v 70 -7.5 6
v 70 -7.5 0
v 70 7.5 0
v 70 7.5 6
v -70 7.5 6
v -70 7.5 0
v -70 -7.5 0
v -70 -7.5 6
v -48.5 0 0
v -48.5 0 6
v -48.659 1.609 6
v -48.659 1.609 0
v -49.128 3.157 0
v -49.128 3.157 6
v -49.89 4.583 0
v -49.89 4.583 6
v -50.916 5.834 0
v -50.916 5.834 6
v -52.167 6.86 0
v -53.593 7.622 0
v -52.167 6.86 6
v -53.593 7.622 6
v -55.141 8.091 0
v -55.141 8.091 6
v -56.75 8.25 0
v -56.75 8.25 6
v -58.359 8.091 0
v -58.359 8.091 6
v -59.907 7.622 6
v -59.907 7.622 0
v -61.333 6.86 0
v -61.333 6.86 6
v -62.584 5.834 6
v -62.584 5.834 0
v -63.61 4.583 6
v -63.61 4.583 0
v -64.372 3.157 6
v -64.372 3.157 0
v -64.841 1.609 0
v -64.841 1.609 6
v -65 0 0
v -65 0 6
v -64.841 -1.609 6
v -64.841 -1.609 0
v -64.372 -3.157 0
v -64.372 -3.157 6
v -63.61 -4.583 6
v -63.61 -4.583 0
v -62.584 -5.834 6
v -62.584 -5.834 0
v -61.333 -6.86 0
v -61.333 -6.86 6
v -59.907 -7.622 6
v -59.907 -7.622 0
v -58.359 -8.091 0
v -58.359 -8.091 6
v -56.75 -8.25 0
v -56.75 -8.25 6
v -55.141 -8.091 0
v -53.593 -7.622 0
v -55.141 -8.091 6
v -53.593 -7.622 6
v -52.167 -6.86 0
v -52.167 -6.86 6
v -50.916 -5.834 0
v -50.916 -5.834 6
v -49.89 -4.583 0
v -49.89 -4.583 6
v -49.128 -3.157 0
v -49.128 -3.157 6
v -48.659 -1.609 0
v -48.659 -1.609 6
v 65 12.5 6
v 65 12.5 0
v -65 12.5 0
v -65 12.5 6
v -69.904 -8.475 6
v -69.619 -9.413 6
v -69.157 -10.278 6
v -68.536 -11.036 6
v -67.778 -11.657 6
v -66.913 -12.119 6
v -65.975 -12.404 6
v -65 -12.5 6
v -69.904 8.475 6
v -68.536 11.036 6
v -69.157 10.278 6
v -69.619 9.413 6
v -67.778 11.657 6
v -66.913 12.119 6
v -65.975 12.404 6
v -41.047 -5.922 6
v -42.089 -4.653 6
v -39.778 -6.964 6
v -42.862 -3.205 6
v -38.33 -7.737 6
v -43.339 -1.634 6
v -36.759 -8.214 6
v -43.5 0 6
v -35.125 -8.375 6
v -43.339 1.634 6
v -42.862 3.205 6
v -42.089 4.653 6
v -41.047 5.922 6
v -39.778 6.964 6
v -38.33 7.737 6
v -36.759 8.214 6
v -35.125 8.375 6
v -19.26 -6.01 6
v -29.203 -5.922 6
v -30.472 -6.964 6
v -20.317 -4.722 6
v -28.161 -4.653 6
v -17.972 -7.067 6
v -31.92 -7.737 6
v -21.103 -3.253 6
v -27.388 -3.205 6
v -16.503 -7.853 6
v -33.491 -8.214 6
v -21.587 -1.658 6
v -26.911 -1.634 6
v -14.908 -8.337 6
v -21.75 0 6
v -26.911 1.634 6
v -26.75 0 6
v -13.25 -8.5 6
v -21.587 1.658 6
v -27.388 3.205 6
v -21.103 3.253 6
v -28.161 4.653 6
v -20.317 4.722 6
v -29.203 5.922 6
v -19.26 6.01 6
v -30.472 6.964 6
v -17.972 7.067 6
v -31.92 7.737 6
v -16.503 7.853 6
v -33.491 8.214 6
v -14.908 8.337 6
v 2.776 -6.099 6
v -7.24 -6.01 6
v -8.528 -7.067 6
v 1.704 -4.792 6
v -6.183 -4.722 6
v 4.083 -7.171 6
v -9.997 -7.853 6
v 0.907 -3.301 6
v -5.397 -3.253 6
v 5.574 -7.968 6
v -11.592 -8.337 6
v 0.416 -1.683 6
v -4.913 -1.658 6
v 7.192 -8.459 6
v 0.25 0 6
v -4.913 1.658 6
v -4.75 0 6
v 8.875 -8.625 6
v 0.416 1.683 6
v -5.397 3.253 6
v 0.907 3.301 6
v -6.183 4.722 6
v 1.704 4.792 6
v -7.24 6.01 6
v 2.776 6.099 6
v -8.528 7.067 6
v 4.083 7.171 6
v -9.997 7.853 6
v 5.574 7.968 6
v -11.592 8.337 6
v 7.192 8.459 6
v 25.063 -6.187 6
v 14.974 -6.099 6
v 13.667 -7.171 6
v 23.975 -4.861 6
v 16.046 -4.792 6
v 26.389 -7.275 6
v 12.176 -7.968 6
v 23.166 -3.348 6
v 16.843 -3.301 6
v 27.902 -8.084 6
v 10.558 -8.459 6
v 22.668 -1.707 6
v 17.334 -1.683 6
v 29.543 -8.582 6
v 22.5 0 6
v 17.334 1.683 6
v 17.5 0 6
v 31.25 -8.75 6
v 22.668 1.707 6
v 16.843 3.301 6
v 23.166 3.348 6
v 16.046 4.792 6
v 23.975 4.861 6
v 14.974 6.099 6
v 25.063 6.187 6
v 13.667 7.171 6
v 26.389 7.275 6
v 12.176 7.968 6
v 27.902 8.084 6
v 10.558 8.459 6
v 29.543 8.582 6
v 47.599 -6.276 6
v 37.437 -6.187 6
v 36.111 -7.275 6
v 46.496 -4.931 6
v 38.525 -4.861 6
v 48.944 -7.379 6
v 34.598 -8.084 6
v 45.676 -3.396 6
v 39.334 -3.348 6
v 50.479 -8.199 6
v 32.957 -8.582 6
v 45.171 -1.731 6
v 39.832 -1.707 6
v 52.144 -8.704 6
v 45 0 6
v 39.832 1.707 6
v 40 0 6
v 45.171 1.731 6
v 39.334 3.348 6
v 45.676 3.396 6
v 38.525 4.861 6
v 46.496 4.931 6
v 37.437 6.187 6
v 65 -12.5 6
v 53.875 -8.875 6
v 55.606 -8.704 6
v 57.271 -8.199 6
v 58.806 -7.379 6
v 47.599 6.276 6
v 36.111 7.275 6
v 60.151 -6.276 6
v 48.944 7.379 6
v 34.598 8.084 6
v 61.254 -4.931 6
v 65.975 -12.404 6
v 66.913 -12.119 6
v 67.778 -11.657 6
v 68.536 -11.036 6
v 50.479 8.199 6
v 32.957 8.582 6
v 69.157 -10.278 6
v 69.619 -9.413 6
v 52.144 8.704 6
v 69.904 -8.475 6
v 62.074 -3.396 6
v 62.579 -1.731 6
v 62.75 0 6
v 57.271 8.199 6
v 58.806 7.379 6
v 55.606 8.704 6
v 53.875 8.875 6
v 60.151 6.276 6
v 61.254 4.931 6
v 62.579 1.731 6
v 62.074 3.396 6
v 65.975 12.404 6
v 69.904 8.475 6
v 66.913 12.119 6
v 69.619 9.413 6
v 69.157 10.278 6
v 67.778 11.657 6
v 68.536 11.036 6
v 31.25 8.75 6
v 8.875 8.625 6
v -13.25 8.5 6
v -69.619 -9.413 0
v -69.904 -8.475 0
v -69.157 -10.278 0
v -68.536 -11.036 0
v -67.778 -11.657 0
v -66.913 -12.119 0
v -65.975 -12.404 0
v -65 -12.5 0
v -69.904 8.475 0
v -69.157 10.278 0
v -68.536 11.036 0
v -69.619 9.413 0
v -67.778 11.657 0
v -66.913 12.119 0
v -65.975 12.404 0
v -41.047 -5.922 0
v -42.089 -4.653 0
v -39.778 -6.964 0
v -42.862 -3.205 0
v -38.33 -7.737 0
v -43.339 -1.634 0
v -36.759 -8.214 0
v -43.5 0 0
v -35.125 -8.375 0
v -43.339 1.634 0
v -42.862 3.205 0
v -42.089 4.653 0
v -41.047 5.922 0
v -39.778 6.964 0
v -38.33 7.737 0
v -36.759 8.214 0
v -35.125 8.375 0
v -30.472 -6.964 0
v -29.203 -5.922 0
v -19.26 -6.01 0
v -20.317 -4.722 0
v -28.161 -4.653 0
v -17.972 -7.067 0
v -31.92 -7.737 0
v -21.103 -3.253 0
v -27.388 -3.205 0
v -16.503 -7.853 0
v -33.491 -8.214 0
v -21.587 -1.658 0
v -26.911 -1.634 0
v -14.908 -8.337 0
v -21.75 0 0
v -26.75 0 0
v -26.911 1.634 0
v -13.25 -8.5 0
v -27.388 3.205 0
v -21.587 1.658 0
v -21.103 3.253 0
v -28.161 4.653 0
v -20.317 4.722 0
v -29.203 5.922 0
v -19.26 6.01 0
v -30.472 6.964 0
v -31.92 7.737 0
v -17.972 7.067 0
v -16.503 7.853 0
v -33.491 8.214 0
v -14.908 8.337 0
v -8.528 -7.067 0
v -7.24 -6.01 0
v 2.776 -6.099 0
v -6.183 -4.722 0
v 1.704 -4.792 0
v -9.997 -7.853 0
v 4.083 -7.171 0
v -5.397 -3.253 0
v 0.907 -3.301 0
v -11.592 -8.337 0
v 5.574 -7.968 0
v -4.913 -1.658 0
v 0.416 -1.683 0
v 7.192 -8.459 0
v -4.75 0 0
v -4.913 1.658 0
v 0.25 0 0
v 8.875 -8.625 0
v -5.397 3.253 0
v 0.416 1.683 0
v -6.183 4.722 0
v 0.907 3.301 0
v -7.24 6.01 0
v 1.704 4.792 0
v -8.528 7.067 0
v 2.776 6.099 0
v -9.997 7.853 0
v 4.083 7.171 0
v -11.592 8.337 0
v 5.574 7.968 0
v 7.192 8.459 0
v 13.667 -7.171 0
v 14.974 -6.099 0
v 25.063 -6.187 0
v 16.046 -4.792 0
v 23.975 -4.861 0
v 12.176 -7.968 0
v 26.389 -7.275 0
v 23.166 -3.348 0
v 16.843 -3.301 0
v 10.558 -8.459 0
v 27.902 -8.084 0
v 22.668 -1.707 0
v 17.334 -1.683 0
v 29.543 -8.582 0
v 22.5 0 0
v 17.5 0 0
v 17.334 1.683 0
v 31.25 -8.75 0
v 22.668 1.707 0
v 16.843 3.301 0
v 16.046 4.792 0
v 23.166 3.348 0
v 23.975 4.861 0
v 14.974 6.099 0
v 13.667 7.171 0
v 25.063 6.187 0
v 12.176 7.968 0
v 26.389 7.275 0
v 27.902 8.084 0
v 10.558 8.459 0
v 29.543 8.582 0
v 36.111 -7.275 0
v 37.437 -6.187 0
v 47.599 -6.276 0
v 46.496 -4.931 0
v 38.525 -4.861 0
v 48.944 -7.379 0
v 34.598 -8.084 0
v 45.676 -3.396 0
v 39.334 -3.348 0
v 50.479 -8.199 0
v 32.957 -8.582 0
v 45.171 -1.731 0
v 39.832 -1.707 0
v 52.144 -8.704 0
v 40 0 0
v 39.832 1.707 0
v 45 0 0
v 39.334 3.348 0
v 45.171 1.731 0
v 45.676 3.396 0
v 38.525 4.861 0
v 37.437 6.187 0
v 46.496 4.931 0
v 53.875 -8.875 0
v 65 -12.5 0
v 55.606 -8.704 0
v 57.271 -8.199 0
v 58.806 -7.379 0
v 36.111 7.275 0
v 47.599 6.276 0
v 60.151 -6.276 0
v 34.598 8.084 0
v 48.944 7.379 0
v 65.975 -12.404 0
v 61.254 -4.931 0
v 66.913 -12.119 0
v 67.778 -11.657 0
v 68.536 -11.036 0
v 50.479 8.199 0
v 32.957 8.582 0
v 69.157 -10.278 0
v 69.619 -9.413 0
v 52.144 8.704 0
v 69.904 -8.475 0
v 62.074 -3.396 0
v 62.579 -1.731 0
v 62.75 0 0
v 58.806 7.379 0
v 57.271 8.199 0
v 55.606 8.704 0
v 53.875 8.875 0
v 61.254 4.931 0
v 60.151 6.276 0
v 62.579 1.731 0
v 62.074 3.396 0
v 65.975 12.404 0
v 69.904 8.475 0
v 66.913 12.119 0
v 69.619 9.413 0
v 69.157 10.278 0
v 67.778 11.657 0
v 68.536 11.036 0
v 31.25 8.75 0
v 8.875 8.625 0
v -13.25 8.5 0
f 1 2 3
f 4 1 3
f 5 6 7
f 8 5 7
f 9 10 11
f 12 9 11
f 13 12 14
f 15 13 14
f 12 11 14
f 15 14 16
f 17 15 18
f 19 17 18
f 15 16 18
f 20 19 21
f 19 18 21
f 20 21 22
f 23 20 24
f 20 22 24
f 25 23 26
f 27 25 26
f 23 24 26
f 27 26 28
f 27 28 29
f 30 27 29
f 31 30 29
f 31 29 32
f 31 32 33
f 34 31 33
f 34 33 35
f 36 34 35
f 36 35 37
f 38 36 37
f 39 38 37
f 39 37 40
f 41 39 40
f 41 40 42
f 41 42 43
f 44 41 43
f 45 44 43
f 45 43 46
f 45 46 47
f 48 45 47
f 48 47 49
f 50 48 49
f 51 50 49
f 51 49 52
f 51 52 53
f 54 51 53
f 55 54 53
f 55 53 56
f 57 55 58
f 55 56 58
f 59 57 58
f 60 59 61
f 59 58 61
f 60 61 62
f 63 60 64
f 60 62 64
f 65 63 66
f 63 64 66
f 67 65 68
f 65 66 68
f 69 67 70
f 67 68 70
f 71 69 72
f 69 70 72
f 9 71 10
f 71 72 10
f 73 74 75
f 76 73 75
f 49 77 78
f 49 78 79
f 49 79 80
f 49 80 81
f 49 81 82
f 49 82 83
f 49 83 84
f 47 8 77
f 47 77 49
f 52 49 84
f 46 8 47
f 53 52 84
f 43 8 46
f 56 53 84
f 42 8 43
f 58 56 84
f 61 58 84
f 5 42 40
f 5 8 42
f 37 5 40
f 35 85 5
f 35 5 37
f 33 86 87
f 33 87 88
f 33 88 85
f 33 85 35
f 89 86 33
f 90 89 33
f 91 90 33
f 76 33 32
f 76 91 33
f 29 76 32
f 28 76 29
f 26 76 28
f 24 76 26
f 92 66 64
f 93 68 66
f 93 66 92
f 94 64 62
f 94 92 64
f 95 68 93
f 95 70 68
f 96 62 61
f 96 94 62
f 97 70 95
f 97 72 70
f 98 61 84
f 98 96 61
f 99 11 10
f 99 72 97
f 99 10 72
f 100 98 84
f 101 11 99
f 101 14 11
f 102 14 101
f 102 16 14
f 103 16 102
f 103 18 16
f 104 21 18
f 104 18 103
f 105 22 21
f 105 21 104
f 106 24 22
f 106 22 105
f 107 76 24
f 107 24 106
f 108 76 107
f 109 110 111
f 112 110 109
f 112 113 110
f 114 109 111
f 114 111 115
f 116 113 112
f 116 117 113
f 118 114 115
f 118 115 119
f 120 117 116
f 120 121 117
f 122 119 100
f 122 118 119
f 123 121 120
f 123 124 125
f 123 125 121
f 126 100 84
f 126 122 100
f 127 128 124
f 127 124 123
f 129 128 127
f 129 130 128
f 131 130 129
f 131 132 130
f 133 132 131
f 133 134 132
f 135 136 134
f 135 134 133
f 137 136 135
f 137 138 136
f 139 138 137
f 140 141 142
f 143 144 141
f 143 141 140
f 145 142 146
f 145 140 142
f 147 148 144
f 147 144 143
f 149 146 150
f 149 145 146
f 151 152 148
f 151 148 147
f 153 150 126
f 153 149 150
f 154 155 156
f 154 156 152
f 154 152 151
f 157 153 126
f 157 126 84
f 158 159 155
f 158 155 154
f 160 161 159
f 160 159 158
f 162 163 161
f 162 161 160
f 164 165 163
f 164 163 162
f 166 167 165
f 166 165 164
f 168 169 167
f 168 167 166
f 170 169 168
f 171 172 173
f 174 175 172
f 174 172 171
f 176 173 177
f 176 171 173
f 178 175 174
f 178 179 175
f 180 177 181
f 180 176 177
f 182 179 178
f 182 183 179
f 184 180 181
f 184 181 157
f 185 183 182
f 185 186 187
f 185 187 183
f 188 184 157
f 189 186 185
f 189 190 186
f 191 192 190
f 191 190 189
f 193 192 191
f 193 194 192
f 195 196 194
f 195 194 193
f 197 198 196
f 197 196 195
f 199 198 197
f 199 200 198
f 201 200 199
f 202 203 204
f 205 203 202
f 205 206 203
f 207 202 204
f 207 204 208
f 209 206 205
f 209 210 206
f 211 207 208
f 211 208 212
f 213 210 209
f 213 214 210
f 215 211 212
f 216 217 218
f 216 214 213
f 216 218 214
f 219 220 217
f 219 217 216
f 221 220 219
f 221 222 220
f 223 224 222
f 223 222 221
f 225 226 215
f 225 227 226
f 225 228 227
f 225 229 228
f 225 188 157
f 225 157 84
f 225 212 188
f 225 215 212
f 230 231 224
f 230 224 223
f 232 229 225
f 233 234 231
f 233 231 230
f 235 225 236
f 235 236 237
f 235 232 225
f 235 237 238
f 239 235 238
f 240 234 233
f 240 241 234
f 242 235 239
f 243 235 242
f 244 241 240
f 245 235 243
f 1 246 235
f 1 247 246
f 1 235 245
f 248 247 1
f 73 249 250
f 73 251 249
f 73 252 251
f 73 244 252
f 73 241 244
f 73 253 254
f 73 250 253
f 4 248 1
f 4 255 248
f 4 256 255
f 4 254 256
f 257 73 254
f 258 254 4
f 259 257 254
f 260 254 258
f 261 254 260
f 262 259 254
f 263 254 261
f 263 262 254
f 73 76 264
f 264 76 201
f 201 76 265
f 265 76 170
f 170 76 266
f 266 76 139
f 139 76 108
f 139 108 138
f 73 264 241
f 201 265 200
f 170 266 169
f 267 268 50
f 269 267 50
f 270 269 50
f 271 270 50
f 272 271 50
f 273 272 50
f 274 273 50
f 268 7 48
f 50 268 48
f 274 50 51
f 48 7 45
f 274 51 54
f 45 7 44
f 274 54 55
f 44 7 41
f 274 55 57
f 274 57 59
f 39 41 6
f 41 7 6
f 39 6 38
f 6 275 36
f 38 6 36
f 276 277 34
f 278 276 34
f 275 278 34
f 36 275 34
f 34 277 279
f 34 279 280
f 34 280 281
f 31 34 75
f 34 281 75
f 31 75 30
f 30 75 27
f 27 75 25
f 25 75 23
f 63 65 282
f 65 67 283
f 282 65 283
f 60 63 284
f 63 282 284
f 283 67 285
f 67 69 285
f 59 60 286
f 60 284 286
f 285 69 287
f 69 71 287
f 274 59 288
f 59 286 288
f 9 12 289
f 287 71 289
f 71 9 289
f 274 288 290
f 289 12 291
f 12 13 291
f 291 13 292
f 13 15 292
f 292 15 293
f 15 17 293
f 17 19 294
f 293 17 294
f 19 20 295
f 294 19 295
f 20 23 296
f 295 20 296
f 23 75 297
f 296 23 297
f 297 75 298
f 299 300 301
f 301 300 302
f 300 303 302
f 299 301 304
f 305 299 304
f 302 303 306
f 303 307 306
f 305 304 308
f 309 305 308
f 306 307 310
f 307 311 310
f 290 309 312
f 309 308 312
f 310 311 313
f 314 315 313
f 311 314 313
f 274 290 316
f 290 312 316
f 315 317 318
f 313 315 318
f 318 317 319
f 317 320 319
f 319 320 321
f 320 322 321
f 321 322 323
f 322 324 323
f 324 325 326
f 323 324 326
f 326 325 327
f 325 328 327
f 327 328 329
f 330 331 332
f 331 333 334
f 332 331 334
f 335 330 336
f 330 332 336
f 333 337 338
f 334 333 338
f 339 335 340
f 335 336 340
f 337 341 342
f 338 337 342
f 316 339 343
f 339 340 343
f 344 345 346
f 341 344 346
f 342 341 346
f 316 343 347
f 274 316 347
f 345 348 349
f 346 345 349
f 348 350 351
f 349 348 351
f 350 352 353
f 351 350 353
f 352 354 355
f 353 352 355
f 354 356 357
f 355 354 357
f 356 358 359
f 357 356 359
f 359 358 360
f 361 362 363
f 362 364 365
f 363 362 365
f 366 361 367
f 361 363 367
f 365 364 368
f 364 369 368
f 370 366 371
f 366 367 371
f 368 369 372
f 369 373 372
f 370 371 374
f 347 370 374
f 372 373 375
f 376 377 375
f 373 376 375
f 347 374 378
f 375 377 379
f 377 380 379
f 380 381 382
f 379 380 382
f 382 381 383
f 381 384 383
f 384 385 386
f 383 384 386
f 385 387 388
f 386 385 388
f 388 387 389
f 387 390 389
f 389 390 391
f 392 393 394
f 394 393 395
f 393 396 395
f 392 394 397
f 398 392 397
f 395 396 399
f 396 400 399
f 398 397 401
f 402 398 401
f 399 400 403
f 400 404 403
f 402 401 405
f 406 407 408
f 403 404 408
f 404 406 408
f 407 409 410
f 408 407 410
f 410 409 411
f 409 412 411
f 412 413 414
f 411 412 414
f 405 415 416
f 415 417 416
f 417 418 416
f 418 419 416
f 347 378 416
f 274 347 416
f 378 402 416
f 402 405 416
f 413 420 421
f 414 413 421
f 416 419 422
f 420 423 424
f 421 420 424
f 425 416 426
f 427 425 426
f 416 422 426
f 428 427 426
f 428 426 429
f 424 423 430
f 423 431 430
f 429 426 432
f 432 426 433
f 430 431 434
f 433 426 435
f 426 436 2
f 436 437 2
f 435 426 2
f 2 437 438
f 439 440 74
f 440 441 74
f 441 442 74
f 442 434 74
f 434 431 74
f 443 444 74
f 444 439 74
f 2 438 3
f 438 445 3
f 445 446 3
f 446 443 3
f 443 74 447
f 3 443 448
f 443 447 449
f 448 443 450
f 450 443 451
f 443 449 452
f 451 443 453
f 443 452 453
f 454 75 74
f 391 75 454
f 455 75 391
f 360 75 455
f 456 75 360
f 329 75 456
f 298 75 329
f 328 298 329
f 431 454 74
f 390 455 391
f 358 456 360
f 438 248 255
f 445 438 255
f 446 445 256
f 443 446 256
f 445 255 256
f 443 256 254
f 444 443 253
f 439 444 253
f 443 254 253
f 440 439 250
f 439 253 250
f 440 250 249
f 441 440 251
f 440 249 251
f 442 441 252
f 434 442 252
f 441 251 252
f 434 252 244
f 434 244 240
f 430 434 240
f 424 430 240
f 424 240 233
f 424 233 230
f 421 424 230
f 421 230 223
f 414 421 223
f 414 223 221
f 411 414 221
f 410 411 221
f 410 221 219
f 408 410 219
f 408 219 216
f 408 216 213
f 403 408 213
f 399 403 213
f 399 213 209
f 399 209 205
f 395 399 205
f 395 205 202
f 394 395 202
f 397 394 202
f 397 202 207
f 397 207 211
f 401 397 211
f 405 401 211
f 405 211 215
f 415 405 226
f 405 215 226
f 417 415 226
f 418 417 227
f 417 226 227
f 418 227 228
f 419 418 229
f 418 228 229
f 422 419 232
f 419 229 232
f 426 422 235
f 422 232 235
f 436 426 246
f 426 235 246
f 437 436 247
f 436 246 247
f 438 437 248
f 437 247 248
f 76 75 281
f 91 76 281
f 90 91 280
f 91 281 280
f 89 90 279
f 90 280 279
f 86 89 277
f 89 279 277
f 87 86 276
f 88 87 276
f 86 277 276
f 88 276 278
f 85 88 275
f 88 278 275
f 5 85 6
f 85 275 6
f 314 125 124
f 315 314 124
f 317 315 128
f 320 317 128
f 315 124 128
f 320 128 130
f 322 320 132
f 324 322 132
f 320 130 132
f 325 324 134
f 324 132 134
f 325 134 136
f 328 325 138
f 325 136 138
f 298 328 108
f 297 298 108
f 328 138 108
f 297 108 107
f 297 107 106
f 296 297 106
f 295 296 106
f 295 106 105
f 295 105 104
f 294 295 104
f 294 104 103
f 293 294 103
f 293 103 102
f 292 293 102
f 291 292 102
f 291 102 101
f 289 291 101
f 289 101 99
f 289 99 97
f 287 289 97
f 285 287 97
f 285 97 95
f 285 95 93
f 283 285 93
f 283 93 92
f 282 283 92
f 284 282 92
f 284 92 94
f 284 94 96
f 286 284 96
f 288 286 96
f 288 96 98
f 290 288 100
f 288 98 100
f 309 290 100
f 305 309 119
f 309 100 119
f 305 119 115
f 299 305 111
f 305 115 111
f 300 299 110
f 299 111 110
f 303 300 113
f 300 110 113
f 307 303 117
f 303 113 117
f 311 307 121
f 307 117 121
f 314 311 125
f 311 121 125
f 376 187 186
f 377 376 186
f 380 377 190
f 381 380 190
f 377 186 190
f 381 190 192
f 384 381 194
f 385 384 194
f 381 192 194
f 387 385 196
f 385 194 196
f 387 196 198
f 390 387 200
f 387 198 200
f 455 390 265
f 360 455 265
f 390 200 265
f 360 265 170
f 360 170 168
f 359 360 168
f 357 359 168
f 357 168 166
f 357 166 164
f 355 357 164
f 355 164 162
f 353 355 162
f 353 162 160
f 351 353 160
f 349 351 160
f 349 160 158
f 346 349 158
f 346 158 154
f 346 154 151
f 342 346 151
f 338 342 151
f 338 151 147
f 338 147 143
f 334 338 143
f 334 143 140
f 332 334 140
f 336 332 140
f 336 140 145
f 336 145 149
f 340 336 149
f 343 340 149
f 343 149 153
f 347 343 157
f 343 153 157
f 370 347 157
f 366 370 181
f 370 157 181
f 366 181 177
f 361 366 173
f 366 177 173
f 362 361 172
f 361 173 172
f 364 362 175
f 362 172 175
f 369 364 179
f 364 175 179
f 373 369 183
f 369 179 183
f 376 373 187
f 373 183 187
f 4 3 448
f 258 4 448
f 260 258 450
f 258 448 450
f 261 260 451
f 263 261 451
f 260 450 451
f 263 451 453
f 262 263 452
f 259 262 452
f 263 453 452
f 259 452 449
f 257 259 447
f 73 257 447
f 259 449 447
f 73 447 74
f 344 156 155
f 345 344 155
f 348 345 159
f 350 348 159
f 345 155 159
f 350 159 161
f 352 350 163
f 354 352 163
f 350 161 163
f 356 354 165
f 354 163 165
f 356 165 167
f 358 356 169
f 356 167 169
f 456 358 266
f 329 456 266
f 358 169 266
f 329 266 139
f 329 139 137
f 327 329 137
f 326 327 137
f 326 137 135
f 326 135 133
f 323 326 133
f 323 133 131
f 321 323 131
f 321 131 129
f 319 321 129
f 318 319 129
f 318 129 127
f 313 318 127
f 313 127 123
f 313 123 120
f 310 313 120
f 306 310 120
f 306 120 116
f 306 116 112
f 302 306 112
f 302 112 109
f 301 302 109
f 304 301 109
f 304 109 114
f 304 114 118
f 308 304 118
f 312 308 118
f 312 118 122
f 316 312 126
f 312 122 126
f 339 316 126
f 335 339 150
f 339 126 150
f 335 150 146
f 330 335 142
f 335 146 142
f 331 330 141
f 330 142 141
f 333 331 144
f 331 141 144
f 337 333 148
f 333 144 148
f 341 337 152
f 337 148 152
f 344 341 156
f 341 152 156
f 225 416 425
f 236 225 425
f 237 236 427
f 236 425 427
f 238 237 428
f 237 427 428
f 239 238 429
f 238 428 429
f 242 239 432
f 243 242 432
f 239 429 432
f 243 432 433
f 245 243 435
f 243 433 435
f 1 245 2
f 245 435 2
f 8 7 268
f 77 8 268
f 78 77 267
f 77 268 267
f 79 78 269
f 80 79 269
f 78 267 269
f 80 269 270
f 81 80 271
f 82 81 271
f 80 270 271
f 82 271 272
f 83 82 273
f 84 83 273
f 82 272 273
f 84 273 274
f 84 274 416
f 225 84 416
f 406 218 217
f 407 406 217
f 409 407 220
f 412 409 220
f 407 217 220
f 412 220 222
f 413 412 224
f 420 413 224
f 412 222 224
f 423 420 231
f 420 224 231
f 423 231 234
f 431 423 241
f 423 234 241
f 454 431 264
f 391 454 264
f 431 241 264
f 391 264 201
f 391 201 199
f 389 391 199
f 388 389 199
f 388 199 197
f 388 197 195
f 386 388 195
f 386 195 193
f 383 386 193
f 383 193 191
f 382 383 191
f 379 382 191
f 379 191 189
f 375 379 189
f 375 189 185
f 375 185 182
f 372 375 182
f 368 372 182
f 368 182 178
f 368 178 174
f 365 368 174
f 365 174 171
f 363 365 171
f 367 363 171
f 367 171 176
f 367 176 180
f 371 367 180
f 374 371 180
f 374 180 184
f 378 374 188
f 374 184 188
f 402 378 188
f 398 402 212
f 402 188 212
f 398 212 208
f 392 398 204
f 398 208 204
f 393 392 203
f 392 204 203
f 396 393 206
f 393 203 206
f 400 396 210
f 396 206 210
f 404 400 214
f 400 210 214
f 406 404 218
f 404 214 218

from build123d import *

# Parameters (mm, degrees)
F1_DEPTH = 6
F2_R     = 8.25
F2_R_2   = 8.375
F2_R_3   = 8.5
F2_R_4   = 8.625
F2_R_5   = 8.75
F2_R_6   = 8.875
F3_DEPTH = 6.001


with BuildPart() as f1:
    # F0 (on Top) → F1 (new body)
    with BuildSketch(Plane.XY):
        with BuildLine():
            Line((65, 12.5), (-65, 12.5))
            ThreePointArc((-65, 12.5), (-68.535534, 11.035534), (-70, 7.5))
            Line((-70, 7.5), (-70, -7.5))
            ThreePointArc((-70, -7.5), (-68.535534, -11.035534), (-65, -12.5))
            Line((-65, -12.5), (65, -12.5))
            ThreePointArc((65, -12.5), (68.535534, -11.035534), (70, -7.5))
            Line((70, -7.5), (70, 7.5))
            ThreePointArc((70, 7.5), (68.535534, 11.035534), (65, 12.5))
        make_face()
    extrude(amount=F1_DEPTH)

    # F2 (on face) → F3 (cut, through all)
    with BuildSketch(Plane.XY.offset(6)):
        with Locations((-56.75, 0)):
            Circle(F2_R)
        with Locations((-35.125, 0)):
            Circle(F2_R_2)
        with Locations((-13.25, 0)):
            Circle(F2_R_3)
        with Locations((8.875, 0)):
            Circle(F2_R_4)
        with Locations((31.25, 0)):
            Circle(F2_R_5)
        with Locations((53.875, 0)):
            Circle(F2_R_6)
    extrude(amount=-F3_DEPTH, mode=Mode.SUBTRACT)


solid = f1.part
